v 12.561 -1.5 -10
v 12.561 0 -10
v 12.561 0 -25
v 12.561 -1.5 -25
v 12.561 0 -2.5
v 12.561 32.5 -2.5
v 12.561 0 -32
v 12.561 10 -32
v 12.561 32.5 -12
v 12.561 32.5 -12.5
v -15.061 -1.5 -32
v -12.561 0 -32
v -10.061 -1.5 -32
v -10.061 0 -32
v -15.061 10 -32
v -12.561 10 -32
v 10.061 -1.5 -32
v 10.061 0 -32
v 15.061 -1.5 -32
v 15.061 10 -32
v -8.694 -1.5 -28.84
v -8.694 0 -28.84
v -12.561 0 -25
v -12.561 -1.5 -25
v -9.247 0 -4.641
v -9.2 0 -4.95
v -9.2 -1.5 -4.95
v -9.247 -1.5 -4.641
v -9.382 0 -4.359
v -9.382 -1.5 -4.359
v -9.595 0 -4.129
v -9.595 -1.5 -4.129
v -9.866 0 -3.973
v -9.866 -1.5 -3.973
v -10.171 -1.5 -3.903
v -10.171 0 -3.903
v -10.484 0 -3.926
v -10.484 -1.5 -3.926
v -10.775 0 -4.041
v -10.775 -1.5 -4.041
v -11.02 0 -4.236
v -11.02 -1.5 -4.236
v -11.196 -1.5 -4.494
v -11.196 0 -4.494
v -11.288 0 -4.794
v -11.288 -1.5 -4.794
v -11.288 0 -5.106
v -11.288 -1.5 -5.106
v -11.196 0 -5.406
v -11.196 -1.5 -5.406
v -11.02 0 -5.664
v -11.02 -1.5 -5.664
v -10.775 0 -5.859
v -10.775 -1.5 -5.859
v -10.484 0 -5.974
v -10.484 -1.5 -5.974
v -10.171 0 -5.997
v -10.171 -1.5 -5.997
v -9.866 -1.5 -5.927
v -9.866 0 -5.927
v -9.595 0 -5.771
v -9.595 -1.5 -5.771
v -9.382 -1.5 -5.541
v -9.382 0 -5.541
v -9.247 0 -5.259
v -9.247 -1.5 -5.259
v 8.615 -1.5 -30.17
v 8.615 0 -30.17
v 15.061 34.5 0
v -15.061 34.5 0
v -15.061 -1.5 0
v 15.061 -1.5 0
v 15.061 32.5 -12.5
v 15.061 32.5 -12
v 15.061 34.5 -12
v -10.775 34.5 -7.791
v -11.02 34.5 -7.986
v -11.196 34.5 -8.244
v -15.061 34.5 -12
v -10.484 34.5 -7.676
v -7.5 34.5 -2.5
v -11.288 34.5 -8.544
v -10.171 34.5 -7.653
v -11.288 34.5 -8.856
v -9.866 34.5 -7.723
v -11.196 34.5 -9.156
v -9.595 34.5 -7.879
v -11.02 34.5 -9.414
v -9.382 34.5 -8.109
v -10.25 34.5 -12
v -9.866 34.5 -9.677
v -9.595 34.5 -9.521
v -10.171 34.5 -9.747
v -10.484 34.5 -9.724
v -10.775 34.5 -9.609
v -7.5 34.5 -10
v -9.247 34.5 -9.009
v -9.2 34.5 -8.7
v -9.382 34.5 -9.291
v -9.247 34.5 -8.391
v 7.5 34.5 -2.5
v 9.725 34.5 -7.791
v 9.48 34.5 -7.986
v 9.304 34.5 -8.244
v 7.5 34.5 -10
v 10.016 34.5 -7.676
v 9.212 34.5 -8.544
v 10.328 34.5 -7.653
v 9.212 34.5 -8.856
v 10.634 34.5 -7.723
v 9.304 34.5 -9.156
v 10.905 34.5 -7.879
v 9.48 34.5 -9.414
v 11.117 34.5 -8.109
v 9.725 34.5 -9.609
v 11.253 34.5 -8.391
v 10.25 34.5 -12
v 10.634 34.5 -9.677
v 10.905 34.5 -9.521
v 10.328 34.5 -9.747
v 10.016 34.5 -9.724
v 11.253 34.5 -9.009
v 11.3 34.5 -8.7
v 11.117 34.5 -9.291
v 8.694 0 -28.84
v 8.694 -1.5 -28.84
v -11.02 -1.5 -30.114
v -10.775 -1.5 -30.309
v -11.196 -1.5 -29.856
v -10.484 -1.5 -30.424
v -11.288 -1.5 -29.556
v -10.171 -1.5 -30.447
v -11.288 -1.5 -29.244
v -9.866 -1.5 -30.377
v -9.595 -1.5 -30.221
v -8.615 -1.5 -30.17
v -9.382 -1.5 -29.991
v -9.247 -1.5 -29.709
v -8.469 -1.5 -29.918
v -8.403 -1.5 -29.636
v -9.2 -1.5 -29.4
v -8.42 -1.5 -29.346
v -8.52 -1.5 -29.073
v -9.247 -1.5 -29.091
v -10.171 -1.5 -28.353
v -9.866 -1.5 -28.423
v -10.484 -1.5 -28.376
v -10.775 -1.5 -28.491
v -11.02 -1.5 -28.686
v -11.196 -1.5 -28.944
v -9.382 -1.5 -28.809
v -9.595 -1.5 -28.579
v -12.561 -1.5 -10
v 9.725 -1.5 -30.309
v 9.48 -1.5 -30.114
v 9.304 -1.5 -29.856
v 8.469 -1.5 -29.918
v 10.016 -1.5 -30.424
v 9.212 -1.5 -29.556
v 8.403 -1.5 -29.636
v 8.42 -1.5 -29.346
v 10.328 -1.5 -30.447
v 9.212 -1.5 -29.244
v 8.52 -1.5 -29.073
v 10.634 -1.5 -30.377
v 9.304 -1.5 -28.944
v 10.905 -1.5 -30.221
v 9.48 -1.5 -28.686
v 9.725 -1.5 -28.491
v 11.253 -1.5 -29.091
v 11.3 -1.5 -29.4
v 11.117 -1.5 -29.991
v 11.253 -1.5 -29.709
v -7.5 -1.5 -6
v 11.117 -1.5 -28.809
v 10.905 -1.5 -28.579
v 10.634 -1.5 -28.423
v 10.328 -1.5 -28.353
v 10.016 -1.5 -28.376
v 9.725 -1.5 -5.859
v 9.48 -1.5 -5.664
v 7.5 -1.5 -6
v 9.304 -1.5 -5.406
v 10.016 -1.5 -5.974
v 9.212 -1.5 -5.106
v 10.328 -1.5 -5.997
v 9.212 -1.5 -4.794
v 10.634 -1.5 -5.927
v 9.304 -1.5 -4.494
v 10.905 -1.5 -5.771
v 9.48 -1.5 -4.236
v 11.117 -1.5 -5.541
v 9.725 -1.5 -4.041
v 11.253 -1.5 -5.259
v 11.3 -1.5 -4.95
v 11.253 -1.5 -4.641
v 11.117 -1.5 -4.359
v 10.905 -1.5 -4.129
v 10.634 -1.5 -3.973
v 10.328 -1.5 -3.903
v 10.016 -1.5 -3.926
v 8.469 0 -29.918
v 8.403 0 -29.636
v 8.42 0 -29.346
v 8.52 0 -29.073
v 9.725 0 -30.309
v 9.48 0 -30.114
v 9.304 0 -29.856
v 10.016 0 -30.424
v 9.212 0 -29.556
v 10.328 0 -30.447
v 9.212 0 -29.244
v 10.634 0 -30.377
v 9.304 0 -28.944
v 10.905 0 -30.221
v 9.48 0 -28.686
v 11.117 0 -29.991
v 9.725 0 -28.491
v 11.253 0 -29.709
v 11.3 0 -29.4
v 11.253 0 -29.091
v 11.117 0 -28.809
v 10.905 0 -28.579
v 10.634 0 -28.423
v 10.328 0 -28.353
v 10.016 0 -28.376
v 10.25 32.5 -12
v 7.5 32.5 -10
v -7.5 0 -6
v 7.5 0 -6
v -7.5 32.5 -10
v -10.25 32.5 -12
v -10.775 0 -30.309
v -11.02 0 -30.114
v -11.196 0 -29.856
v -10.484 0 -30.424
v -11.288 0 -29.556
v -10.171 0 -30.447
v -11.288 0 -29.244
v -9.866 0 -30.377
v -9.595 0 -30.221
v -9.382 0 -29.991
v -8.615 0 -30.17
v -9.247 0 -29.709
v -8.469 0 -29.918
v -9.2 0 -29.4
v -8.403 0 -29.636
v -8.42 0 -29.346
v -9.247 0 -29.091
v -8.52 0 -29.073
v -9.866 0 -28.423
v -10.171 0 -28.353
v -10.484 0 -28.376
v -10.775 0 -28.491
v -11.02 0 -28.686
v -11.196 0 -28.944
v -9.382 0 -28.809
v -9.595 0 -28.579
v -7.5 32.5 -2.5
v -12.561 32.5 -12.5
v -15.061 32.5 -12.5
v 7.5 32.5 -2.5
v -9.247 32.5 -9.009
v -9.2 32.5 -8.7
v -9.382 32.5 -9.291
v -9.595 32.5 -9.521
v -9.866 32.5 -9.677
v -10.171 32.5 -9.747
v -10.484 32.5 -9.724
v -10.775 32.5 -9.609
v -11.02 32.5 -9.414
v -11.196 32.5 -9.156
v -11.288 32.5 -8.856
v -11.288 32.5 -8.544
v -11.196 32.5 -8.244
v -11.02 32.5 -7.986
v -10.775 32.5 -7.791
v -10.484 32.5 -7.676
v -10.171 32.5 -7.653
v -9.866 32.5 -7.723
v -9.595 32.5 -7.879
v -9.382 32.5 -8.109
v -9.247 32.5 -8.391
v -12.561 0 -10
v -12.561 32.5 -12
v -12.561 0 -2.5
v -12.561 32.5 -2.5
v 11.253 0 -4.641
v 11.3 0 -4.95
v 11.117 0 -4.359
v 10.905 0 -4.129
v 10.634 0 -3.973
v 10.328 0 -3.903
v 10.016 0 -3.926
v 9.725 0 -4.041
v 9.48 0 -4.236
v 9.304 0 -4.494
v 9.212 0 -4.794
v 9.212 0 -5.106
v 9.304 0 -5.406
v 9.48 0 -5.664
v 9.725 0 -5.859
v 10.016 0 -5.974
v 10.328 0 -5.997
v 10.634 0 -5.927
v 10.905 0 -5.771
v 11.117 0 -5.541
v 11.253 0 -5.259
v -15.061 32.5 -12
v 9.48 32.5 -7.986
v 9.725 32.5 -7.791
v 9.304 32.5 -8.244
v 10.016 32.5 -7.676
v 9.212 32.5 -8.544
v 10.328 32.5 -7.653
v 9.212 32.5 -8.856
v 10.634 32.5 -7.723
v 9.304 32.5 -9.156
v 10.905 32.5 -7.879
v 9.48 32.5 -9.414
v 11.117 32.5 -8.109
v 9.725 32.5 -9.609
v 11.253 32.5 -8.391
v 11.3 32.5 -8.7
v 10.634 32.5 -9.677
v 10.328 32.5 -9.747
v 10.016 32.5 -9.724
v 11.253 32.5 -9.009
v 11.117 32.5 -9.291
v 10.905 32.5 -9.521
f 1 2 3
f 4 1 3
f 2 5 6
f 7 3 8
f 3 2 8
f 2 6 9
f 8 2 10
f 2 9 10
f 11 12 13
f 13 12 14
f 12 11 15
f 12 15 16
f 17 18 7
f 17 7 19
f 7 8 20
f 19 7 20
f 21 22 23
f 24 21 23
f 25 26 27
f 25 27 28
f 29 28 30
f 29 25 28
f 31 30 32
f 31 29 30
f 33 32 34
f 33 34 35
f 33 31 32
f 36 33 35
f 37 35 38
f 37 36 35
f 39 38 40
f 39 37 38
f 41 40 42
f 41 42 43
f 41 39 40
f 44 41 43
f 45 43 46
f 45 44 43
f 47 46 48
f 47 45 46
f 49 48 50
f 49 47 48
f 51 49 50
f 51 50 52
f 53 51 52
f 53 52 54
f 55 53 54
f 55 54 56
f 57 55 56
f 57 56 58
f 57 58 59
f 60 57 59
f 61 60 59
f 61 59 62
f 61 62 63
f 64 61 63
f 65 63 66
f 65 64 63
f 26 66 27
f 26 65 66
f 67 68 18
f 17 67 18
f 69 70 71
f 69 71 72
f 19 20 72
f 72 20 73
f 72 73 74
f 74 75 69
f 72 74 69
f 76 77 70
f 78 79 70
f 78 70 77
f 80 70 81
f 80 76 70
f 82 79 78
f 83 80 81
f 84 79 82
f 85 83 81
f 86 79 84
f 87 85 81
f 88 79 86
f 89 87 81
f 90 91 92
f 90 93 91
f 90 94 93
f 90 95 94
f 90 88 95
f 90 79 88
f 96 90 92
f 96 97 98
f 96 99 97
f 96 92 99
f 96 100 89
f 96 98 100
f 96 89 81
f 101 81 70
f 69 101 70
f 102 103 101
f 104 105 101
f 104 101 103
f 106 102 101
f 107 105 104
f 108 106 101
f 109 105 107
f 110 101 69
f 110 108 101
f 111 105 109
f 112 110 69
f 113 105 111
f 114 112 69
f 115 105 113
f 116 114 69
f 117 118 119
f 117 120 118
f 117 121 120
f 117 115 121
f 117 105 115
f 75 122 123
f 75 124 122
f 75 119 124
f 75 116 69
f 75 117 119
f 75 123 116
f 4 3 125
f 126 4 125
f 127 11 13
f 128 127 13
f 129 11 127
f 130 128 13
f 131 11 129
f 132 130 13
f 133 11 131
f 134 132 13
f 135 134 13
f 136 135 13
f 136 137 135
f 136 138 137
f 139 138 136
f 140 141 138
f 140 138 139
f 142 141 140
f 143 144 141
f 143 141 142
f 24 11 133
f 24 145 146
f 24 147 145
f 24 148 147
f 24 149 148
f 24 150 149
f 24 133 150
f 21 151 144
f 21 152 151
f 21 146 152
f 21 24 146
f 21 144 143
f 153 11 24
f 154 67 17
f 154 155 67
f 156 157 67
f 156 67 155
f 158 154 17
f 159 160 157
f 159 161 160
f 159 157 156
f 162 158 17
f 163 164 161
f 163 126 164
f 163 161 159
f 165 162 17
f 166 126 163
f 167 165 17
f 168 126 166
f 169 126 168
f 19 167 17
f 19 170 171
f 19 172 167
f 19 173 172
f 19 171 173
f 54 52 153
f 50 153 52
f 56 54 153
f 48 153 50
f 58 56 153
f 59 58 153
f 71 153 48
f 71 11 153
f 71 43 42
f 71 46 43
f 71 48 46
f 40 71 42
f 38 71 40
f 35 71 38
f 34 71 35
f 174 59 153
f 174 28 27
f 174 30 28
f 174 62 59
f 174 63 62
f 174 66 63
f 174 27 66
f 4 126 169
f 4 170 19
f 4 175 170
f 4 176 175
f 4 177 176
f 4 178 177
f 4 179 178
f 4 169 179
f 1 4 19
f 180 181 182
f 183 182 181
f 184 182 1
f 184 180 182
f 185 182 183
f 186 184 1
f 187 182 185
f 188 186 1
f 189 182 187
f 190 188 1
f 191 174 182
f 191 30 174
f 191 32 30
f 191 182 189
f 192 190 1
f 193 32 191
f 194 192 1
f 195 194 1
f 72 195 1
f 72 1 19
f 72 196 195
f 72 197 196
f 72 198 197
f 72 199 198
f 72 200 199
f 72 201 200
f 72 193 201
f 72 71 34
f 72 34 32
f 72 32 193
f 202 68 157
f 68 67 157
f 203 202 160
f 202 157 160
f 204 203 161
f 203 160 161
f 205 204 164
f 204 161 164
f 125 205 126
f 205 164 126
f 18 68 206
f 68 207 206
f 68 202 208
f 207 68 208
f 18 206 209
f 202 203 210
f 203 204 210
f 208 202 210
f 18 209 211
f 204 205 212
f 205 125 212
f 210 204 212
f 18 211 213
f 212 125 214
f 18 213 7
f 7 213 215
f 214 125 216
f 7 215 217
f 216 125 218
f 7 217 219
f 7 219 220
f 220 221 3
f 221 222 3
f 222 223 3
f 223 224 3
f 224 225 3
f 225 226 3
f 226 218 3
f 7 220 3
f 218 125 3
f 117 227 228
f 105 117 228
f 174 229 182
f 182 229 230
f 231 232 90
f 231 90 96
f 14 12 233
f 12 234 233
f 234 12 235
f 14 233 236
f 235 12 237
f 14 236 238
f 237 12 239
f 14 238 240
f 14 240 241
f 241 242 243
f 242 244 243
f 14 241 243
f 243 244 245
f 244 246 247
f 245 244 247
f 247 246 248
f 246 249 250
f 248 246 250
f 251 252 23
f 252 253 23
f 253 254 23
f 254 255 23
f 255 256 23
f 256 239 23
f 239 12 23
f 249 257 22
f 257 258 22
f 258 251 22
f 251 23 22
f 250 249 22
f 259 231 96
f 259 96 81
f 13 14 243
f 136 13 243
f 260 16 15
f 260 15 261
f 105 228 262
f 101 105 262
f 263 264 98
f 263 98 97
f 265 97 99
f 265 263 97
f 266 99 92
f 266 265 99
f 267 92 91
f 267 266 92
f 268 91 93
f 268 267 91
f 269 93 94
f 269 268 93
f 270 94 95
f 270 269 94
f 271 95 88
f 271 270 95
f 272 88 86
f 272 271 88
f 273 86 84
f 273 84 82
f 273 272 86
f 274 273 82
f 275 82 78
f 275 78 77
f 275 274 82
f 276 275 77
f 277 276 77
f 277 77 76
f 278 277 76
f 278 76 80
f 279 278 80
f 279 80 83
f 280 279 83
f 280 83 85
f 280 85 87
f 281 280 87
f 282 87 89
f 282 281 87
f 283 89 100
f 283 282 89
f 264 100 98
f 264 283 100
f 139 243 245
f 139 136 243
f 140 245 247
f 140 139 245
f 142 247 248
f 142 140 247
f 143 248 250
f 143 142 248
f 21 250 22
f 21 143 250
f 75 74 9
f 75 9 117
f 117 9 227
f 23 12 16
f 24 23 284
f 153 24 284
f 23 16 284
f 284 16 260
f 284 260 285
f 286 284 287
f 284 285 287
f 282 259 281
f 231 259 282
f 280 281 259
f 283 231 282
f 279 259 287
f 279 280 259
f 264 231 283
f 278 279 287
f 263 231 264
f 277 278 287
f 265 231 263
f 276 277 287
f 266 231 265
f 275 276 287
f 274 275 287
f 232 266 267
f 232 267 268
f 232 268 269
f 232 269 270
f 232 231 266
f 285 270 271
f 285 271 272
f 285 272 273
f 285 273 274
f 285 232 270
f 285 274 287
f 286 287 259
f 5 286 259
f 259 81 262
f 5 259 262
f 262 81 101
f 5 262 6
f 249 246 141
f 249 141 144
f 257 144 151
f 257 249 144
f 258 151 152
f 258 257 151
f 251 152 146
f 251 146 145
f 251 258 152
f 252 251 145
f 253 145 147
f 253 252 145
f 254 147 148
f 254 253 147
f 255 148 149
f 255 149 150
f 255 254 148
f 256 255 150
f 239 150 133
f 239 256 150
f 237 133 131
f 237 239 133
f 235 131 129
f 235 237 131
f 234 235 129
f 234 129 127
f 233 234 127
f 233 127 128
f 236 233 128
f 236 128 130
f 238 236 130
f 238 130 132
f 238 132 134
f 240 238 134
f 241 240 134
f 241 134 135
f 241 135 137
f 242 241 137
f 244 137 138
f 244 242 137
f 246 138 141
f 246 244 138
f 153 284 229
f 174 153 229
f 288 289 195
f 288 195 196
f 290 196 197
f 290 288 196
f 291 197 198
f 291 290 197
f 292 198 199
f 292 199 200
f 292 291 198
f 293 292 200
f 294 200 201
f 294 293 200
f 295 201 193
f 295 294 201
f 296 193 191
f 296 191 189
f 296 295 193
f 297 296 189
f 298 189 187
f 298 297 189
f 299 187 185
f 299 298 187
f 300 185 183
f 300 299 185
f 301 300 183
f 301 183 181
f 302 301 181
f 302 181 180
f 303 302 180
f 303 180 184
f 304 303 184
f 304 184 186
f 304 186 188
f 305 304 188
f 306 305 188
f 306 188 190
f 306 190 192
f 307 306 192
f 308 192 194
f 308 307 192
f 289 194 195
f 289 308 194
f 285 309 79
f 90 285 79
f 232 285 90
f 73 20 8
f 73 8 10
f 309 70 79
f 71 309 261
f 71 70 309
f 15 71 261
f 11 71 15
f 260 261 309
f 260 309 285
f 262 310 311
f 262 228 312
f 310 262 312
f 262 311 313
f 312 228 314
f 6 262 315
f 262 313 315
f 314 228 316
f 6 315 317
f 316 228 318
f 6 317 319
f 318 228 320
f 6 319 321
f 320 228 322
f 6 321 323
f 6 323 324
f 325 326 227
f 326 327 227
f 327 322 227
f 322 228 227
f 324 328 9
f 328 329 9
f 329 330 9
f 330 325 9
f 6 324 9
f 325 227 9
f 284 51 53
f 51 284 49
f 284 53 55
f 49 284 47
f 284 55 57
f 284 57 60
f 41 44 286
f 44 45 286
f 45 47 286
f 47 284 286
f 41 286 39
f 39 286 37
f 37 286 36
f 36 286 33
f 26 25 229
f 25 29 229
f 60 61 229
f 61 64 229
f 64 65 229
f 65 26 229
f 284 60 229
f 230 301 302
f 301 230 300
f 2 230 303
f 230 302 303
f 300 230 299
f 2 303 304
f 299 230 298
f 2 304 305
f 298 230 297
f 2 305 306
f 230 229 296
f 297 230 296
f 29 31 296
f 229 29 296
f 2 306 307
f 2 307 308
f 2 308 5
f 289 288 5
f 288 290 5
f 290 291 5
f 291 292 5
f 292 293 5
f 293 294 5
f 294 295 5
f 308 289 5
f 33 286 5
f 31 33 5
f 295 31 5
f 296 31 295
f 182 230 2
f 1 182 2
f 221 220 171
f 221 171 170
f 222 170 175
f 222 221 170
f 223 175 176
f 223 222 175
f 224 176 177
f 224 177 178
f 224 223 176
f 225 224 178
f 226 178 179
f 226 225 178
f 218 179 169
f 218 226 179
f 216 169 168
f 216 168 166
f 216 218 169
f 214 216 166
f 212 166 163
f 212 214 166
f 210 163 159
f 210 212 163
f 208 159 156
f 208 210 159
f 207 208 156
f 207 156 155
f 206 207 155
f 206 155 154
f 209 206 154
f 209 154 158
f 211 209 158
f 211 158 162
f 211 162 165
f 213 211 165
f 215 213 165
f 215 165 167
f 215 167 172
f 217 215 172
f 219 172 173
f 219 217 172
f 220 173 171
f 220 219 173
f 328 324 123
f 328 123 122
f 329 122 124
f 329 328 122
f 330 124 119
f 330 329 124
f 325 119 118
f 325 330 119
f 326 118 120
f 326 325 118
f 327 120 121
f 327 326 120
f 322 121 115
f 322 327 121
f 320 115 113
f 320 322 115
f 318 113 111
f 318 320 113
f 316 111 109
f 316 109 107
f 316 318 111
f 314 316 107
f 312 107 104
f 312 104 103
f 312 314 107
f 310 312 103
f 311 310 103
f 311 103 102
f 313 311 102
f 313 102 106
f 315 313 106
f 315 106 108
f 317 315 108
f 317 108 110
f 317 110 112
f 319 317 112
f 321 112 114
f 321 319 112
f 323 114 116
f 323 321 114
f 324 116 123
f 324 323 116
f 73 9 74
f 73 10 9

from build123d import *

# Parameters (mm, degrees)
BOSS_EXTRUDE1_DEPTH = 32.5
CUT_EXTRUDE1_DEPTH  = 31.122
SKETCH4_R           = 1.05
BOSS_EXTRUDE2_DEPTH = 1.5
SKETCH5_R           = 1.05
BOSS_EXTRUDE3_DEPTH = 2
FILLET1_R           = 1
SKETCH6_W           = 15
SKETCH6_H           = 2.5
BOSS_EXTRUDE4_DEPTH = 2


with BuildPart() as part:
    # Sketch2 → Boss-Extrude1 (new body)
    with BuildSketch(Plane(origin=(0, 0, 0), x_dir=(1, 0, 0), z_dir=(0, 1, 0))):
        Polygon((15.061, 0), (15.061, 32), (12.561, 32), (12.561, 2.5), (-12.561, 2.5), (-12.561, 32), (-15.061, 32), (-15.061, 0), align=None)
    extrude(amount=BOSS_EXTRUDE1_DEPTH)

    # Sketch3 → Cut-Extrude1 (cut, through all)
    with BuildSketch(Plane(origin=(15.061, 0, 0), x_dir=(0, 0, -1), z_dir=(1, 0, 0))):
        Polygon((32, 10), (12.5, 32.5), (32, 32.5), align=None)
    extrude(amount=-CUT_EXTRUDE1_DEPTH, mode=Mode.SUBTRACT)

    # Sketch4 → Boss-Extrude2 (add)
    with BuildSketch(Plane.XZ):
        Polygon((-15.061, 0), (-15.061, -32), (-10.061, -32), (-8.061, -29.4695), (-12.561, -25), (-12.561, -10), (-7.5, -6), (7.5, -6), (12.561, -10), (12.561, -25), (8.061, -29.4695), (10.061, -32), (15.061, -32), (15.061, 0), align=None)
        with Locations((-10.2499, -4.95)):
            Circle(SKETCH4_R, mode=Mode.SUBTRACT)
        with Locations((-10.2499, -29.4)):
            Circle(SKETCH4_R, mode=Mode.SUBTRACT)
        with Locations((10.2499, -29.4)):
            Circle(SKETCH4_R, mode=Mode.SUBTRACT)
        with Locations((10.2499, -4.95)):
            Circle(SKETCH4_R, mode=Mode.SUBTRACT)
    extrude(amount=BOSS_EXTRUDE2_DEPTH)

    # Sketch5 → Boss-Extrude3 (add)
    with BuildSketch(Plane(origin=(0, 32.5, 0), x_dir=(1, 0, 0), z_dir=(0, 1, 0))):
        Polygon((-15.061, 12), (-10.2499, 12), (-7.5, 10), (-7.5, 0), (-15.061, 0), align=None)
        with Locations((-10.2499, 8.7)):
            Circle(SKETCH5_R, mode=Mode.SUBTRACT)
        Polygon((15.061, 12), (10.2499, 12), (7.5, 10), (7.5, 0), (15.061, 0), align=None)
        with Locations((10.2499, 8.7)):
            Circle(SKETCH5_R, mode=Mode.SUBTRACT)
    extrude(amount=BOSS_EXTRUDE3_DEPTH)

    # Fillet1
    fillet1_edges = [part.edges().sort_by_distance(p)[0] for p in [
        (-8.061, -0.75, -29.4695),
        (8.061, -0.75, -29.4695),
    ]]
    fillet(fillet1_edges, radius=FILLET1_R)

    # Sketch6 → Boss-Extrude4 (add)
    with BuildSketch(Plane(origin=(0, 34.5, 0), x_dir=(1, 0, 0), z_dir=(0, 1, 0))):
        with Locations((0, 1.25)):
            Rectangle(SKETCH6_W, SKETCH6_H)
    extrude(amount=-BOSS_EXTRUDE4_DEPTH)


solid = part.part
